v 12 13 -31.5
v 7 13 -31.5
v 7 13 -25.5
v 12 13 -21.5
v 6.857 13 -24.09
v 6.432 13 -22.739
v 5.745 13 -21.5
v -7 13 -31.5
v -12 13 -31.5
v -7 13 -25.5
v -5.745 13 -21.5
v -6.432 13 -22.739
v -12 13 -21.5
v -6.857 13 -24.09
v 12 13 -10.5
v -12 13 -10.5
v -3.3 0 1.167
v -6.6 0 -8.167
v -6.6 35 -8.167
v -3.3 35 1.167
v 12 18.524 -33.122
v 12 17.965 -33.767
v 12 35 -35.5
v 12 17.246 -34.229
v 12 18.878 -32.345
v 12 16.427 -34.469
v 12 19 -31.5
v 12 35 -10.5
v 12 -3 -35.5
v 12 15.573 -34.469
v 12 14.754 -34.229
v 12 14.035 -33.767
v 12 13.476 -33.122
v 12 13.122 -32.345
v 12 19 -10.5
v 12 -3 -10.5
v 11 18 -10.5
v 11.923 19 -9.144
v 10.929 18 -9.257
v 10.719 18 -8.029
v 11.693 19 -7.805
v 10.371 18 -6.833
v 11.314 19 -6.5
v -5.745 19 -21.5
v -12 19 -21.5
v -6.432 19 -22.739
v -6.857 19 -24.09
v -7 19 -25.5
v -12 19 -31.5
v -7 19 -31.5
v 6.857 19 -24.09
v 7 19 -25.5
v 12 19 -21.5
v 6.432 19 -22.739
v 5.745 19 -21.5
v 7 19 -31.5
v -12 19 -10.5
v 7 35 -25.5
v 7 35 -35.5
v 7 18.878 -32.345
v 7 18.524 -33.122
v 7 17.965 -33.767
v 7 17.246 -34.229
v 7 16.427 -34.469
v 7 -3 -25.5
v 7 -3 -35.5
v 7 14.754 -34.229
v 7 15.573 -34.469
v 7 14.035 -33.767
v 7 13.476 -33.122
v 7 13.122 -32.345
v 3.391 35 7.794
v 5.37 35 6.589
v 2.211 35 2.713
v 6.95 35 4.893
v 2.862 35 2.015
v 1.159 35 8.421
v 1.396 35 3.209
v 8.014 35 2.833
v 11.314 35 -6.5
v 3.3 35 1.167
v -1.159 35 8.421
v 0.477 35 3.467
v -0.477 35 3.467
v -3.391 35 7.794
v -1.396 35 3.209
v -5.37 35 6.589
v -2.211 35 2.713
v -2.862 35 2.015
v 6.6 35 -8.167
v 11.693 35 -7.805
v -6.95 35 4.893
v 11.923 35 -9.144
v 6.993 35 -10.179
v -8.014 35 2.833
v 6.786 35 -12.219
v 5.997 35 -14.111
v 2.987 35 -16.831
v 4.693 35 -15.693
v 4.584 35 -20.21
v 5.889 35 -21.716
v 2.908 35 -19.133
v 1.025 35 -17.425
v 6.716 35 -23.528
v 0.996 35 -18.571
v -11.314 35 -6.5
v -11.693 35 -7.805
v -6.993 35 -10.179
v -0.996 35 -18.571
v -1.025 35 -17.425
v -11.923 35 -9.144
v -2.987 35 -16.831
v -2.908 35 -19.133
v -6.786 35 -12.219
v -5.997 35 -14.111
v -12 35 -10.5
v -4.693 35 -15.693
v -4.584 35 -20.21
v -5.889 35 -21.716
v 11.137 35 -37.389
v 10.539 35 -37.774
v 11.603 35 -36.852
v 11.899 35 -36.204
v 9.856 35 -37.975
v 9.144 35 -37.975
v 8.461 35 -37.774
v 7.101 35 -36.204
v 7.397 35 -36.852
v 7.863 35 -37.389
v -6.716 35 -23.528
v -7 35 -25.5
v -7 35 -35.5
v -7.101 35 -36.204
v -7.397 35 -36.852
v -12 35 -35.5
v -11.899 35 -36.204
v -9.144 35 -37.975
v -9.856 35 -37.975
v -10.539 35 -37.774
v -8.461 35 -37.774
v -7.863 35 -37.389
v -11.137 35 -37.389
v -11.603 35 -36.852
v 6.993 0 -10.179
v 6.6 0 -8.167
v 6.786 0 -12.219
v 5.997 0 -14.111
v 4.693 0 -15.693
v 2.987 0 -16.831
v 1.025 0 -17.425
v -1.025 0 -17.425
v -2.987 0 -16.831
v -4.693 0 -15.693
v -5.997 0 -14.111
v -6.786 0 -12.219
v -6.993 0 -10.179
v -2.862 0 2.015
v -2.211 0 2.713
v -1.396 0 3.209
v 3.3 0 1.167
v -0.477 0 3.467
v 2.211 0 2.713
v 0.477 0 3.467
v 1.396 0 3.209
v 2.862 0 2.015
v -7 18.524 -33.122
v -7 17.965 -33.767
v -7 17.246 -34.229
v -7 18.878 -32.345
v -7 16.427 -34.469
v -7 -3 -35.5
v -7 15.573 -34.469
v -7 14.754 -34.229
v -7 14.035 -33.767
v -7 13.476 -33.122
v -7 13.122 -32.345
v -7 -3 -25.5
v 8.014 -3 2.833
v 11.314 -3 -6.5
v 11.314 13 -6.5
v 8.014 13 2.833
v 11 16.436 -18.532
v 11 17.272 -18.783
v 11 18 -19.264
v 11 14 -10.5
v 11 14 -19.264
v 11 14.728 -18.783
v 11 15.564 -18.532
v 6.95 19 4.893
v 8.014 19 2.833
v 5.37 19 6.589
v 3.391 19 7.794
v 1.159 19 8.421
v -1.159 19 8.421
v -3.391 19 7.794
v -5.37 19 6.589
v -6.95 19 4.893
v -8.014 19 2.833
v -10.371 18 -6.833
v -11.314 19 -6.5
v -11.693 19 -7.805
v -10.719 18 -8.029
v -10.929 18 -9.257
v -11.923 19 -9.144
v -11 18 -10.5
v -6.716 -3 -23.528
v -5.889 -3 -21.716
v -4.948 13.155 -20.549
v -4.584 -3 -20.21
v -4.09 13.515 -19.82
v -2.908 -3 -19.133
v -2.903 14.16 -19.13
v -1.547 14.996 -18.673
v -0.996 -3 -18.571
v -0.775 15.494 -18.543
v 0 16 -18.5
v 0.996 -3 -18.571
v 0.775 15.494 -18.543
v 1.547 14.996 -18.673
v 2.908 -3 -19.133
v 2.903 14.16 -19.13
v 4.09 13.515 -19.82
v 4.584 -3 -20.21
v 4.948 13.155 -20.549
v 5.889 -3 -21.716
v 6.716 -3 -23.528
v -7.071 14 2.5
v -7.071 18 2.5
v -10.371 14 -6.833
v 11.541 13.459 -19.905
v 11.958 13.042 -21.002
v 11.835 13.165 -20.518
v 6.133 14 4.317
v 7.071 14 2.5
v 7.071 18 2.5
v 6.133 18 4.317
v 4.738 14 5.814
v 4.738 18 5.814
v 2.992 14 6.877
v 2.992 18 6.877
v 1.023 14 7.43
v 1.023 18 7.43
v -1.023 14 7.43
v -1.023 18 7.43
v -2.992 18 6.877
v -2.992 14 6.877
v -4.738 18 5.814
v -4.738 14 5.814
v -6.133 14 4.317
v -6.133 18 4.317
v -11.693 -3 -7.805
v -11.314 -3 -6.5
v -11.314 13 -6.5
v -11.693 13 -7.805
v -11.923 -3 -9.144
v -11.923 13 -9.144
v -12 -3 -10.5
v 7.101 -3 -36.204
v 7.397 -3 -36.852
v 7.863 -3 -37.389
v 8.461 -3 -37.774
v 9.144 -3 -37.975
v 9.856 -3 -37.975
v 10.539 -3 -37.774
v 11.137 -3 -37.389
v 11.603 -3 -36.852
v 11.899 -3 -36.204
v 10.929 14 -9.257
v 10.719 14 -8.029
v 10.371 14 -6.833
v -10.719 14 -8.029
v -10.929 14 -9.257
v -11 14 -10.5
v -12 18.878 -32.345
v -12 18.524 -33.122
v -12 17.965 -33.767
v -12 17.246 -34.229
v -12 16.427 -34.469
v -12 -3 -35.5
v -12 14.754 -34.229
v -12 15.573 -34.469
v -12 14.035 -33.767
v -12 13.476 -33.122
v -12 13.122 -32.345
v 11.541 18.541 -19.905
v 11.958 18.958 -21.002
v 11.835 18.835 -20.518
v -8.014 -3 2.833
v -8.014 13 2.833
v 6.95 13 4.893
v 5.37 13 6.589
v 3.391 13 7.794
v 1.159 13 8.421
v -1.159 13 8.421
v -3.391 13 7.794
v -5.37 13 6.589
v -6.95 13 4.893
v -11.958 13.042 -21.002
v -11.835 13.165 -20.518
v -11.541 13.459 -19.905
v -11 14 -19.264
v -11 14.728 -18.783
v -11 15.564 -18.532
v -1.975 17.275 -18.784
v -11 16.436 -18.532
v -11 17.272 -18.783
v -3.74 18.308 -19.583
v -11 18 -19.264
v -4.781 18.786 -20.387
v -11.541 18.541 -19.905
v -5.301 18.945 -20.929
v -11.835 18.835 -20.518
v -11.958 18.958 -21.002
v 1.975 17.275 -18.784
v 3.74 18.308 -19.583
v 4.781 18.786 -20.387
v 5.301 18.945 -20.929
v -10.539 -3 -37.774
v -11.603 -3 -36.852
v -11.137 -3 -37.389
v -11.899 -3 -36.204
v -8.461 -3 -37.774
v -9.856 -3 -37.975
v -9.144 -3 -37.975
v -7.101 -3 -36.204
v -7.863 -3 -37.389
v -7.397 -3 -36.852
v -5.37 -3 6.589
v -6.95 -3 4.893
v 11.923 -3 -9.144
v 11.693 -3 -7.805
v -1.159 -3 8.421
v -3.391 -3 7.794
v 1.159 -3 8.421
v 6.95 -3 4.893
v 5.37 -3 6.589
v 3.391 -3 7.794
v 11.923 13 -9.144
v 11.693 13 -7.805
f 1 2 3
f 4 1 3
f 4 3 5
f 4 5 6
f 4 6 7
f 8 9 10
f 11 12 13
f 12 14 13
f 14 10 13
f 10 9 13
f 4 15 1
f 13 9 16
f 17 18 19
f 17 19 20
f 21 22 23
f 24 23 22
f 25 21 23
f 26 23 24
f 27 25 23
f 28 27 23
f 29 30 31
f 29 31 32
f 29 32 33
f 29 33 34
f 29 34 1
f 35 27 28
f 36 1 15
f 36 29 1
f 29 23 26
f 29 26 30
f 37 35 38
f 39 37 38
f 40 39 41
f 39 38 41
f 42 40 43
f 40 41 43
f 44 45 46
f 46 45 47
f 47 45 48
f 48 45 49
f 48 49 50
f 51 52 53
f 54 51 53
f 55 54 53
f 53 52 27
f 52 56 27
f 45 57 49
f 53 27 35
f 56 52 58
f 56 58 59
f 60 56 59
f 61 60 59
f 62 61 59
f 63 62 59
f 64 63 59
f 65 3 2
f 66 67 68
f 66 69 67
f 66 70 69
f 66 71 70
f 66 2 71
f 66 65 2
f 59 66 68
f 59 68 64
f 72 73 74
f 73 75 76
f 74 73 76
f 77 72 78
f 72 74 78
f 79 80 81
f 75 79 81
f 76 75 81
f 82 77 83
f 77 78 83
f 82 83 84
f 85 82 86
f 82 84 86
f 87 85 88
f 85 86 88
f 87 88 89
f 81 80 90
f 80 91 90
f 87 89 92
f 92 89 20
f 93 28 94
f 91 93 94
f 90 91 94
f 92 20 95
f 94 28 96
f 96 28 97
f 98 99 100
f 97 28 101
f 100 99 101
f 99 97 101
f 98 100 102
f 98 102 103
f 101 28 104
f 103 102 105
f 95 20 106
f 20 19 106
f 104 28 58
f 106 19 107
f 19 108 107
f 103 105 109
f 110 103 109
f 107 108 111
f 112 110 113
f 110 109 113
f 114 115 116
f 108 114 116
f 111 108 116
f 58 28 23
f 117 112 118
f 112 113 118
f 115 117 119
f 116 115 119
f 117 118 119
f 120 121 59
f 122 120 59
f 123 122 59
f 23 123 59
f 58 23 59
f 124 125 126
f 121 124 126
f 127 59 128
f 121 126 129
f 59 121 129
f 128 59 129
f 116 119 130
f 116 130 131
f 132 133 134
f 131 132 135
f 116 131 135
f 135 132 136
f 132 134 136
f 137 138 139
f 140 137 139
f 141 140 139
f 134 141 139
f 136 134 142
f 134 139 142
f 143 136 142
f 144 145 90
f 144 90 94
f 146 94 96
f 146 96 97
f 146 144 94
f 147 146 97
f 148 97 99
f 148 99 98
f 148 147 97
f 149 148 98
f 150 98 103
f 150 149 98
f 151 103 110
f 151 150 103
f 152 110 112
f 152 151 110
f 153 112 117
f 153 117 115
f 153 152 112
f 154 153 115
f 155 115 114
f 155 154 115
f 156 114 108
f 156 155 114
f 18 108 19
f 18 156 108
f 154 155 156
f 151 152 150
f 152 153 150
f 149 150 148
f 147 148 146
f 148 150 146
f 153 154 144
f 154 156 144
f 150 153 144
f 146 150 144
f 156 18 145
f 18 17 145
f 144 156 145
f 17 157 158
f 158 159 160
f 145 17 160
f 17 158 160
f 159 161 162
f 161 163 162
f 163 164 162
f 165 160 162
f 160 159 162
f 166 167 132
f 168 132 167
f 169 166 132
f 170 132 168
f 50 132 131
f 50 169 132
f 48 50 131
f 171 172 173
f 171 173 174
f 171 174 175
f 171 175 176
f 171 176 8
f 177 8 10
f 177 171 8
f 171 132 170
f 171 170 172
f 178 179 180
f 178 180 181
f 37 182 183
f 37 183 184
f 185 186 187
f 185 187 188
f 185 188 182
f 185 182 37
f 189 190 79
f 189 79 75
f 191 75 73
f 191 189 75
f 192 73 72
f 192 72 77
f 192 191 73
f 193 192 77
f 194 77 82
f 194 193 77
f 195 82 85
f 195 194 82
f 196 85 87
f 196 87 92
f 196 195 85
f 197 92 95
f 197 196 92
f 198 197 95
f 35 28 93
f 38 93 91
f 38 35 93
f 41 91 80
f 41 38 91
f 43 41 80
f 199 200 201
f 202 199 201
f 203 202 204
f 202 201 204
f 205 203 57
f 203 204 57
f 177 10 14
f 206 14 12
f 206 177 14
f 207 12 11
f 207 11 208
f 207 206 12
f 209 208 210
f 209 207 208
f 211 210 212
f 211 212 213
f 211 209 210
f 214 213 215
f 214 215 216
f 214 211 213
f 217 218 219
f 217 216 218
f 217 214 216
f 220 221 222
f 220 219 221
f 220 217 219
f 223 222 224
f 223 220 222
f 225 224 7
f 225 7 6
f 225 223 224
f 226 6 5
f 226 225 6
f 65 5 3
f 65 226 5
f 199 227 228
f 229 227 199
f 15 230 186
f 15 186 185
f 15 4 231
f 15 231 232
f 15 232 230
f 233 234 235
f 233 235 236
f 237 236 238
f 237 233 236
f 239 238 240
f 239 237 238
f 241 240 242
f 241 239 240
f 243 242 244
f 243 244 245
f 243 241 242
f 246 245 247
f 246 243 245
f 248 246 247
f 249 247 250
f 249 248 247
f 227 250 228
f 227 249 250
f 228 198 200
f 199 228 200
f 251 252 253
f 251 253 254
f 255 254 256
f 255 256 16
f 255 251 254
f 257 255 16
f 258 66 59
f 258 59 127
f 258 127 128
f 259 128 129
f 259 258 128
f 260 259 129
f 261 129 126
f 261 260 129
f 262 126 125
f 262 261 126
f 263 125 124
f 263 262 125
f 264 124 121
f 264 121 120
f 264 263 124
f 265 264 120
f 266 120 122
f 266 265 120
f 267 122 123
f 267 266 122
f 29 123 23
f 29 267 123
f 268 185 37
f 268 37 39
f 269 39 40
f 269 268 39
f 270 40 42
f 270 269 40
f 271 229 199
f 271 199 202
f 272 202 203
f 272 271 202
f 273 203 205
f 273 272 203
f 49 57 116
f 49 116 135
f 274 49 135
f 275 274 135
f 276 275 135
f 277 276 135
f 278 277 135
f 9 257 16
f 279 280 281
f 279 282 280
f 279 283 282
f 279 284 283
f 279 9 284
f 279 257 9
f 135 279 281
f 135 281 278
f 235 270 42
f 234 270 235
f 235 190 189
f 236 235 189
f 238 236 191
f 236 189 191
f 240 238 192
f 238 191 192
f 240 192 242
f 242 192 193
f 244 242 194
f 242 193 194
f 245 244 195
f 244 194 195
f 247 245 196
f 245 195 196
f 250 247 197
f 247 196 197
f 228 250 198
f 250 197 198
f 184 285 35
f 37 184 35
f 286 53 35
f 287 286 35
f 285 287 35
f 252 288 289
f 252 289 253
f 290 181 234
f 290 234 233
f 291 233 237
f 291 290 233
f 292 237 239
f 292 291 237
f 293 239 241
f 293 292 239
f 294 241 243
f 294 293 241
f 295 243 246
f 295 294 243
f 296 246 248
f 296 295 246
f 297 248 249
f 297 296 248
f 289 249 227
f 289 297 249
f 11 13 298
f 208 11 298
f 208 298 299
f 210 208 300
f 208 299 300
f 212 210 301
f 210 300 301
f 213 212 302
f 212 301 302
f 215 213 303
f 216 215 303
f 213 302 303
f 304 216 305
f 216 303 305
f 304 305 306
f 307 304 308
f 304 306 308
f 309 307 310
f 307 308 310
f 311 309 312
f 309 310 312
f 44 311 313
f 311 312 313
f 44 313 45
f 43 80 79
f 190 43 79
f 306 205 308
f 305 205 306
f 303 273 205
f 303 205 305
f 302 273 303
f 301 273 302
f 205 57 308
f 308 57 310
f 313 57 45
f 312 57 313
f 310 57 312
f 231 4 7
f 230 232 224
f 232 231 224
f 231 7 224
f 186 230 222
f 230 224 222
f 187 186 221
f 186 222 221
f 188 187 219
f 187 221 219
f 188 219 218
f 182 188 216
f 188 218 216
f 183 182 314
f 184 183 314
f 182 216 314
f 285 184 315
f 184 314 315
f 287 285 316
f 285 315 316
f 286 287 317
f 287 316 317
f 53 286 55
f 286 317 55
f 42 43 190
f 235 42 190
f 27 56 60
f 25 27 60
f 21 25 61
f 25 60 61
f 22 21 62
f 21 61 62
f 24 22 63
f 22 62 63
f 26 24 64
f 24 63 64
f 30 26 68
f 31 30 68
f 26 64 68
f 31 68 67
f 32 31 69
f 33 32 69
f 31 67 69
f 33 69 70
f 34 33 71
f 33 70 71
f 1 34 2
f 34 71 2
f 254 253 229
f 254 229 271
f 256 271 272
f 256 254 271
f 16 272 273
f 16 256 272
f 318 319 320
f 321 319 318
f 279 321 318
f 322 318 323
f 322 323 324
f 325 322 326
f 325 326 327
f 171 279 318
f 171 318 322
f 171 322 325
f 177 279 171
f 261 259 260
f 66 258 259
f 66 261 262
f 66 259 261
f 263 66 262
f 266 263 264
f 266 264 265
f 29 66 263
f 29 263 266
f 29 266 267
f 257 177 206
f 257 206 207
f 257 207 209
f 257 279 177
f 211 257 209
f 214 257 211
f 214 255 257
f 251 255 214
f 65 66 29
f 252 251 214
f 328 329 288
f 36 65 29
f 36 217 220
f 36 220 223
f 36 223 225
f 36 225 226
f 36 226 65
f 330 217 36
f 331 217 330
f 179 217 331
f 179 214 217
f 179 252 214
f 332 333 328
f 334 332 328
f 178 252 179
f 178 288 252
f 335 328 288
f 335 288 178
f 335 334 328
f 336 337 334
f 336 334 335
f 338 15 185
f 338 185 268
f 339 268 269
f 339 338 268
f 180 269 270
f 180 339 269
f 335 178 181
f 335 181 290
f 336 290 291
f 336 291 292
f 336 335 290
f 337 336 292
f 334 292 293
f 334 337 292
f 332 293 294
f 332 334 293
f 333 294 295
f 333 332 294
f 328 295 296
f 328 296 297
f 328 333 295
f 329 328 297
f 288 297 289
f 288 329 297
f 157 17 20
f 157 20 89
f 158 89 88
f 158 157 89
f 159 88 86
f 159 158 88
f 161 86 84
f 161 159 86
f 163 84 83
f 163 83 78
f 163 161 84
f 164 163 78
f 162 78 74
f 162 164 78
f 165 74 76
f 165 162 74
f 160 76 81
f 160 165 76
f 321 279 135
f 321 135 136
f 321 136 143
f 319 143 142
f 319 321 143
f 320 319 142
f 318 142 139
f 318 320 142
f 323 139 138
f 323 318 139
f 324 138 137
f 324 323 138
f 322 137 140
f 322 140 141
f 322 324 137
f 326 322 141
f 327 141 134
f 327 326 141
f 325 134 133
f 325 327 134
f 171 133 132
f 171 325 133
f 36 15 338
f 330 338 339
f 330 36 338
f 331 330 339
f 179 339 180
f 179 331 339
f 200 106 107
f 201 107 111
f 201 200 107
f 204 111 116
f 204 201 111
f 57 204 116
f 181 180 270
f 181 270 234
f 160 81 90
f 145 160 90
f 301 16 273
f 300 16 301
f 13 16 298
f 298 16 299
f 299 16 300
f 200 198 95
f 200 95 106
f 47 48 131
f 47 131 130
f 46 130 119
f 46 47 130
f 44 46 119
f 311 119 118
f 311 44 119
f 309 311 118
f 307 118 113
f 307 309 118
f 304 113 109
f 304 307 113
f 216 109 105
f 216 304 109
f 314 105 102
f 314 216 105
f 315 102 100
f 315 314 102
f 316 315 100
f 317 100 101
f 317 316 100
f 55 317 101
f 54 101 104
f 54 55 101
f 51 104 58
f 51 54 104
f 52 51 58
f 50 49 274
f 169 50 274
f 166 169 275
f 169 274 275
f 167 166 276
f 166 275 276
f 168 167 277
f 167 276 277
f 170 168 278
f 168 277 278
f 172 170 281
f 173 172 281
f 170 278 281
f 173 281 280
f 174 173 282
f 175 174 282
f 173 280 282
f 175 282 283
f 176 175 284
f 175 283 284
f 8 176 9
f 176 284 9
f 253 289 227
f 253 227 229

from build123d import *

# Parameters (mm, degrees)
BOSS_EXTRUDE1_DEPTH     = 35
BOSS_EXTRUDE2_START     = 3
BOSS_EXTRUDE2_DEPTH     = 3
CUT_EXTRUDE1_DEPTH      = 54.037722425
CUT_EXTRUDE1_DEPTH_BACK = 54.037722425
CUT_EXTRUDE2_START      = -3
CUT_EXTRUDE2_DEPTH      = 6
CHAMFER1_SIZE           = 1


with BuildPart() as part:
    # Sketch1 → Boss-Extrude1 (new body)
    with BuildSketch(Plane(origin=(0, 0, 0), x_dir=(1, 0, 0), z_dir=(0, 1, 0))):
        with BuildLine():
            Line((7, 25.5), (7, 35.5))
            ThreePointArc((7, 35.5), (9.5, 38), (12, 35.5))
            Line((12, 35.5), (12, 10.5))
            ThreePointArc((12, 10.5), (11.827182716, 8.470776255), (11.313708499, 6.5))
            Line((11.313708499, 6.5), (8.013876853, -2.833333333))
            ThreePointArc((8.013876853, -2.833333333), (0, -8.5), (-8.013876853, -2.833333333))
            Line((-8.013876853, -2.833333333), (-11.313708499, 6.5))
            ThreePointArc((-11.313708499, 6.5), (-11.827182716, 8.470776255), (-12, 10.5))
            Line((-12, 10.5), (-12, 35.5))
            ThreePointArc((-12, 35.5), (-9.5, 38), (-7, 35.5))
            Line((-7, 35.5), (-7, 25.5))
            ThreePointArc((-7, 25.5), (0, 18.5), (7, 25.5))
        make_face()
        with BuildLine():
            Line((-6.599663291, 8.166666667), (-3.299831646, -1.166666667))
            ThreePointArc((-3.299831646, -1.166666667), (0, -3.5), (3.299831646, -1.166666667))
            Line((3.299831646, -1.166666667), (6.599663291, 8.166666667))
            ThreePointArc((6.599663291, 8.166666667), (0, 17.5), (-6.599663291, 8.166666667))
        make_face(mode=Mode.SUBTRACT)
    extrude(amount=BOSS_EXTRUDE1_DEPTH)

    # Sketch2 → Boss-Extrude2 (add)
    with BuildSketch(Plane.XZ.offset(BOSS_EXTRUDE2_START)):
        with BuildLine():
            Line((-12, -10.5), (-12, -35.5))
            ThreePointArc((-12, -35.5), (-9.5, -38), (-7, -35.5))
            Line((-7, -35.5), (-7, -25.5))
            ThreePointArc((-7, -25.5), (0, -18.5), (7, -25.5))
            Line((7, -25.5), (7, -35.5))
            ThreePointArc((7, -35.5), (9.5, -38), (12, -35.5))
            Line((12, -35.5), (12, -10.5))
            ThreePointArc((12, -10.5), (11.827182716, -8.470776255), (11.313708499, -6.5))
            Line((11.313708499, -6.5), (8.013876853, 2.833333333))
            ThreePointArc((8.013876853, 2.833333333), (0, 8.5), (-8.013876853, 2.833333333))
            Line((-8.013876853, 2.833333333), (-11.313708499, -6.5))
            ThreePointArc((-11.313708499, -6.5), (-11.827182716, -8.470776255), (-12, -10.5))
        make_face()
    extrude(amount=-BOSS_EXTRUDE2_DEPTH)

    # Sketch4 → Cut-Extrude1 (cut, two sides: drawn at the far end of the back side and taken through both)
    with BuildSketch(Plane(origin=(0, 0, 0), x_dir=(0, 0, -1), z_dir=(1, 0, 0)).offset(-CUT_EXTRUDE1_DEPTH_BACK)):
        with BuildLine():
            Line((21.5, 19), (31.5, 19))
            ThreePointArc((31.5, 19), (34.5, 16), (31.5, 13))
            Line((31.5, 13), (21.5, 13))
            ThreePointArc((21.5, 13), (18.5, 16), (21.5, 19))
        make_face()
    extrude(amount=CUT_EXTRUDE1_DEPTH + CUT_EXTRUDE1_DEPTH_BACK, mode=Mode.SUBTRACT)

    # Sketch5 → Cut-Extrude2 (cut)
    with BuildSketch(Plane(origin=(0, 16, 0), x_dir=(1, 0, 0), z_dir=(0, 1, 0)).offset(CUT_EXTRUDE2_START)):
        with BuildLine():
            Line((-11, 21.5), (-25, 21.5))
            Line((-25, 21.5), (-25, -28.5))
            Line((-25, -28.5), (25, -28.5))
            Line((25, -28.5), (25, 21.5))
            Line((25, 21.5), (11, 21.5))
            Line((11, 21.5), (11, 10.5))
            ThreePointArc((11, 10.5), (10.841584156, 8.639878234), (10.370899457, 6.833333333))
            Line((10.370899457, 6.833333333), (7.071067812, -2.5))
            ThreePointArc((7.071067812, -2.5), (0, -7.5), (-7.071067812, -2.5))
            Line((-7.071067812, -2.5), (-10.370899457, 6.833333333))
            ThreePointArc((-10.370899457, 6.833333333), (-10.841584156, 8.639878234), (-11, 10.5))
            Line((-11, 10.5), (-11, 21.5))
        make_face()
    extrude(amount=CUT_EXTRUDE2_DEPTH, mode=Mode.SUBTRACT)

    # Chamfer1
    chamfer1_edges = [part.edges().sort_by_distance(p)[0] for p in [
        (11, 19, -16),
        (10.841584156, 19, -8.639878234),
        (0, 19, 7.5),
        (-10.841584156, 19, -8.639878234),
        (-11, 13, -16),
        (-8.720983635, 13, -2.166666667),
        (8.720983635, 13, -2.166666667),
        (11, 13, -16),
        (-11, 19, -16),
        (-8.720983635, 19, -2.166666667),
        (0, 13, 7.5),
        (8.720983635, 19, -2.166666667),
        (10.841584156, 13, -8.639878234),
        (-10.841584156, 13, -8.639878234),
    ]]
    chamfer(chamfer1_edges, length=CHAMFER1_SIZE - 0.0001)  # a hair under: the kernel refuses the full size


solid = part.part
